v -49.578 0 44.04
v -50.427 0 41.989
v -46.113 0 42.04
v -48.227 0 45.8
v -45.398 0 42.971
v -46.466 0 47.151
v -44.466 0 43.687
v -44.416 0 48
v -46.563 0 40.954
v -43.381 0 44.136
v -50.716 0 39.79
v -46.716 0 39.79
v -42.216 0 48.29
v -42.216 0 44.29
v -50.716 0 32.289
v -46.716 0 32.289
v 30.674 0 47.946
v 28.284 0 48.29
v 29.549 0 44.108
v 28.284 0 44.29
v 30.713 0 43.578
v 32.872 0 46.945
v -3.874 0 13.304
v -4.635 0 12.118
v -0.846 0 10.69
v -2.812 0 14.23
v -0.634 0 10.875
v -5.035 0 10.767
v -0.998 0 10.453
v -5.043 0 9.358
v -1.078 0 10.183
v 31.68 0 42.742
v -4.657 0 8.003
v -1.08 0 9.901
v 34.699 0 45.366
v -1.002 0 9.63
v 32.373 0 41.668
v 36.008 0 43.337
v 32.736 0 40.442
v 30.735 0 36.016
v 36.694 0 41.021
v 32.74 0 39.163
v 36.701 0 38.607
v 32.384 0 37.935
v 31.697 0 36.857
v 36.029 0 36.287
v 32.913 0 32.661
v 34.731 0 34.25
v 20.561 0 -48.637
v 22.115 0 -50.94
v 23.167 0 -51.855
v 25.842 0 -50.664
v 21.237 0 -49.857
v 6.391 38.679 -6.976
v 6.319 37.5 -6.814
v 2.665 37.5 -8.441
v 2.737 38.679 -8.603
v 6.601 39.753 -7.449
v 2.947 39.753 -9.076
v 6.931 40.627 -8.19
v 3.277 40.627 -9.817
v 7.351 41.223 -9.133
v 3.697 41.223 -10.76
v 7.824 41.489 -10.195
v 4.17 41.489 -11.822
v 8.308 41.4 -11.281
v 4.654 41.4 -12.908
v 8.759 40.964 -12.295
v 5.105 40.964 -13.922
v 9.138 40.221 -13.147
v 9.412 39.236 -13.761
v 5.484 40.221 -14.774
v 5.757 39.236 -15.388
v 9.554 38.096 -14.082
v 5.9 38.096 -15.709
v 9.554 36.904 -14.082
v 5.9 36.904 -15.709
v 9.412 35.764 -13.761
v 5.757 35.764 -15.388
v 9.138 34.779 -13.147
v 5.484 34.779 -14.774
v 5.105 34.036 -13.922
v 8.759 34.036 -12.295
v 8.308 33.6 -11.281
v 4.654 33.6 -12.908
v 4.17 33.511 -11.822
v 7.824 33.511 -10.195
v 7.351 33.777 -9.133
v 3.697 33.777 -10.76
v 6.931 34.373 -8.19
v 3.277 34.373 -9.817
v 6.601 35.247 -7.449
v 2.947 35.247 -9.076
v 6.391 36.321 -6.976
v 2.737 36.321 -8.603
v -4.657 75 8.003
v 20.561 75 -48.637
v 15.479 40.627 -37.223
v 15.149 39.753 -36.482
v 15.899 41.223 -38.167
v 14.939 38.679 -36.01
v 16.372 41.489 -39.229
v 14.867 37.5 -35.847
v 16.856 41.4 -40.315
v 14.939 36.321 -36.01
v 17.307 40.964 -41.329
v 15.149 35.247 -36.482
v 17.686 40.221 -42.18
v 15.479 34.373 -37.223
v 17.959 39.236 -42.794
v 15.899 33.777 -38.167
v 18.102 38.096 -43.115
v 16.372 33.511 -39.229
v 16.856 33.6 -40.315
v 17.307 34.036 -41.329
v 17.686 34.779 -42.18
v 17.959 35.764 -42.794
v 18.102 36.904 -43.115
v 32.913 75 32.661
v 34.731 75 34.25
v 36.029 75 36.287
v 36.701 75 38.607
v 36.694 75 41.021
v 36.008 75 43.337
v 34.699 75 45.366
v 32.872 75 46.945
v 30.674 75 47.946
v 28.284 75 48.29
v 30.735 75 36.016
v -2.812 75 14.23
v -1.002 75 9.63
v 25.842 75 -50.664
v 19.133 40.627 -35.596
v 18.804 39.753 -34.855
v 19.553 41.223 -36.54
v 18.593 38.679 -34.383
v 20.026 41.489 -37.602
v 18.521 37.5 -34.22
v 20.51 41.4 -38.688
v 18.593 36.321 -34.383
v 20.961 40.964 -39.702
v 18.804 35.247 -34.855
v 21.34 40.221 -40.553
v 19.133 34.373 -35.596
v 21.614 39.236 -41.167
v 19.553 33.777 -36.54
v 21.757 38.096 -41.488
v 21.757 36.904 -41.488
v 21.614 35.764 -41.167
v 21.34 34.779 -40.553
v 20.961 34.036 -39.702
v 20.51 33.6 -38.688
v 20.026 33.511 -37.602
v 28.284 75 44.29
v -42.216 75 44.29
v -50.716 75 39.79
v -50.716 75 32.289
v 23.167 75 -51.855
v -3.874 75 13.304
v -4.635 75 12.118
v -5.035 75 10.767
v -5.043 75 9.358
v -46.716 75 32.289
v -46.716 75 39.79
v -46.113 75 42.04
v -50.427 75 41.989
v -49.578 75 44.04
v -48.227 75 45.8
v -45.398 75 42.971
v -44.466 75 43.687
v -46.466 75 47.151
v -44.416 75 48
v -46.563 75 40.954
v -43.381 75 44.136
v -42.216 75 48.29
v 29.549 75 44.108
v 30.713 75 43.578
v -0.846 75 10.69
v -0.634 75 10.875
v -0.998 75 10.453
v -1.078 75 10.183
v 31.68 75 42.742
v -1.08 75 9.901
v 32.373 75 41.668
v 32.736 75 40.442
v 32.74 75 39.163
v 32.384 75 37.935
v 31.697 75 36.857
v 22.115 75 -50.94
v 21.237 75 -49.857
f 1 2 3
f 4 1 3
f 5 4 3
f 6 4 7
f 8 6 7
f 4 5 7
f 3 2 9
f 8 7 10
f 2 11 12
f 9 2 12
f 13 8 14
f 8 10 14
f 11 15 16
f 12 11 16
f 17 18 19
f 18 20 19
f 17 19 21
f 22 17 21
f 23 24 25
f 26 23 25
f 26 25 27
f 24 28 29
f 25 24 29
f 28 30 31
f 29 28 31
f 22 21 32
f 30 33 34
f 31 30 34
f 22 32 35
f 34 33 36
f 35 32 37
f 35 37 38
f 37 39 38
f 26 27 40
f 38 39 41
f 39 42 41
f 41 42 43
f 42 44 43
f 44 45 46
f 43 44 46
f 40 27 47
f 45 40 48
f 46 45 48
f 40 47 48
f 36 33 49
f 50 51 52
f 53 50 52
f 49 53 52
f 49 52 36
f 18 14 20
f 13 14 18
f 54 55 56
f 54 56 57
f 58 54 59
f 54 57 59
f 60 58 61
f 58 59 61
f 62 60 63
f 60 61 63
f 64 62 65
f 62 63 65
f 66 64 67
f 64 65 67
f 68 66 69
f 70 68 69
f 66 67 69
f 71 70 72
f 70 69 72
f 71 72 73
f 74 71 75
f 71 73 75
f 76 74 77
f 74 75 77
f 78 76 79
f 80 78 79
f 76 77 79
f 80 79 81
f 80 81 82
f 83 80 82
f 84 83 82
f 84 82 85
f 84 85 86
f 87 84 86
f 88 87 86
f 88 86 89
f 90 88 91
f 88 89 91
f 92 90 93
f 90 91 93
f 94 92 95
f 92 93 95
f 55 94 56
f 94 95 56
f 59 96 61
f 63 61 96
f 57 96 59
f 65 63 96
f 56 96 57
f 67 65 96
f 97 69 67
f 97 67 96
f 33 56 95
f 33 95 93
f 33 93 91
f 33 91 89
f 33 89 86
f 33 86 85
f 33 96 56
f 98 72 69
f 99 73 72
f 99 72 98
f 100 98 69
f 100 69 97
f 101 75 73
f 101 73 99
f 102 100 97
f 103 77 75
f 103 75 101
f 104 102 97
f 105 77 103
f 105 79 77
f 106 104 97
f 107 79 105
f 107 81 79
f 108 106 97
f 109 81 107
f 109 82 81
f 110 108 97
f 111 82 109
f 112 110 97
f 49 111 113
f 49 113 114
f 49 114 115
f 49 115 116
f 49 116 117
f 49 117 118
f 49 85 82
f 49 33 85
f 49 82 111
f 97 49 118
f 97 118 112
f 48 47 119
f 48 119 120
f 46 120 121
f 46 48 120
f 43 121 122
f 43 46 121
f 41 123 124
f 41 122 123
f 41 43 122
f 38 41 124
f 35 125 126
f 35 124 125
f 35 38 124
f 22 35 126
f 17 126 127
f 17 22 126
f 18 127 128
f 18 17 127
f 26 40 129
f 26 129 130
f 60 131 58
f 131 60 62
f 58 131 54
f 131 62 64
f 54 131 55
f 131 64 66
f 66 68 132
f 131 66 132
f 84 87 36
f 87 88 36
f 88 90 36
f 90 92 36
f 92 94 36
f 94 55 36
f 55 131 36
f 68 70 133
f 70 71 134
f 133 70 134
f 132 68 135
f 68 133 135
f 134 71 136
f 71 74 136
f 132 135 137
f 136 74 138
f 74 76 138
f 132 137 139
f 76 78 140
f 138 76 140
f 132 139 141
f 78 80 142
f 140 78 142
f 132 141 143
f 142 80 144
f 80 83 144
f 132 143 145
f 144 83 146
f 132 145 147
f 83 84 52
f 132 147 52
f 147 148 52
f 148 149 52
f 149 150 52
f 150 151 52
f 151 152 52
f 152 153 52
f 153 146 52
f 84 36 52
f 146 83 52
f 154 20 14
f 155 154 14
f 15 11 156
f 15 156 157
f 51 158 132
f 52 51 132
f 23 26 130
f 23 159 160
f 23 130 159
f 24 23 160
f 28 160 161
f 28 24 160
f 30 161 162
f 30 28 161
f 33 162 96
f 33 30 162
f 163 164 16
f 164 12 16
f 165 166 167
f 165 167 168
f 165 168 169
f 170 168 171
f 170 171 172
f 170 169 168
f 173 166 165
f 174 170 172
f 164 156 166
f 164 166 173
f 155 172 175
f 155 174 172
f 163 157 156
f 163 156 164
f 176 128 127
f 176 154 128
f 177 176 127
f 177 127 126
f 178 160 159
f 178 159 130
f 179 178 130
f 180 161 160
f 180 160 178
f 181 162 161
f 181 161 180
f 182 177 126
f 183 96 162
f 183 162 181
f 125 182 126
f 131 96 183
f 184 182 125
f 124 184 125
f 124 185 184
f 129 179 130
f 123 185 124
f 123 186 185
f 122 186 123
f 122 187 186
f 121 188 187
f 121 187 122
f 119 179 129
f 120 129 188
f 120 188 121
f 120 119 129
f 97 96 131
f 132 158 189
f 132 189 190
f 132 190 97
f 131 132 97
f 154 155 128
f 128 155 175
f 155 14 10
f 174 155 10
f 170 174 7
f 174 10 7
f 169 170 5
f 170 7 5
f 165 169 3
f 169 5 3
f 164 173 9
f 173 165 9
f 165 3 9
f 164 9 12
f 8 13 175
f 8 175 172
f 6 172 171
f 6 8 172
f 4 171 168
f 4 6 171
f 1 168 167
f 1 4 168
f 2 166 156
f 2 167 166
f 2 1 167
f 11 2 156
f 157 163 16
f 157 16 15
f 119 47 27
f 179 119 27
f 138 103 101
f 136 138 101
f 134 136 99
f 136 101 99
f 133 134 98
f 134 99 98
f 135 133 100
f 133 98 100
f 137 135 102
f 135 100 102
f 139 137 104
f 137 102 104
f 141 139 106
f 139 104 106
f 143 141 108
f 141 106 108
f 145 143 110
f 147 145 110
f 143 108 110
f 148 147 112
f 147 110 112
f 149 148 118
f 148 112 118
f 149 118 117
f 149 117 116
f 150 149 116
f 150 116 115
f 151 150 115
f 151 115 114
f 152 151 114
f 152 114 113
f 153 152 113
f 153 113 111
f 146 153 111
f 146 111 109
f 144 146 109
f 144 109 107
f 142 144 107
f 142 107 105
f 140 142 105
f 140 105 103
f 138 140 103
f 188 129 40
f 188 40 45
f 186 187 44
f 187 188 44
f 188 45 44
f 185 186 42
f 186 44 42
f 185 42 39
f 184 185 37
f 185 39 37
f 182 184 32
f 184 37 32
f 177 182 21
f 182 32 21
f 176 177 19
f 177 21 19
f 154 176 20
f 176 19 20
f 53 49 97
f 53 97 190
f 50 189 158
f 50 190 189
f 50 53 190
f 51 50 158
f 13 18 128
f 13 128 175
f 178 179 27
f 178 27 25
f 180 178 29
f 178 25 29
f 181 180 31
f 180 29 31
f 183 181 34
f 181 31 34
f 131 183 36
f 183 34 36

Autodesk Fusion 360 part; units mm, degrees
sketch "Sketch1" plane through (0, 0, 0) normal (0, 1, 0) x (1, 0, 0)
  arc A0 (31.1232, 52.6914) -> (20.5609, 48.637) centre (27.8693, 45.3831) ccw
  line L0 (31.1232, 52.6914) -> (40.2587, 48.6241)
  arc A1 (28.2837, -48.2895) -> (32.9132, -32.6608) centre (28.2837, -39.7895) ccw
  line L1 (28.2837, -48.2895) -> (-42.2163, -48.2895)
  arc A2 (-4.6567, -8.0029) -> (-2.8122, -14.2299) centre (-0.089, -10.0365) ccw
  line L2 (22.8004, 52.0184) -> (38.6317, 44.9699)
  line L3 (-46.7163, -32.2895) -> (-50.7163, -32.2895)
  line L4 (35.3386, -39.0053) -> (-23.3345, -39.0053) construction
  arc A3 (28.2837, -44.2895) -> (30.7346, -36.0155) centre (28.2837, -39.7895) ccw
  line L5 (40.2587, 48.6241) -> (38.6317, 44.9699)
  line L6 (30.7346, -36.0155) -> (-2.8122, -14.2299)
  line L7 (-50.7163, -39.7895) -> (-50.7163, -32.2895)
  line L8 (32.9132, -32.6608) -> (-0.6336, -10.8752)
  arc A4 (-46.7163, -39.7895) -> (-42.2163, -44.2895) centre (-42.2163, -39.7895) ccw
  arc A5 (-50.7163, -39.7895) -> (-42.2163, -48.2895) centre (-42.2163, -39.7895) ccw
  line L9 (-4.6567, -8.0029) -> (20.5609, 48.637)
  line L10 (28.2837, -44.2895) -> (-42.2163, -44.2895)
  line L11 (-46.7163, -39.7895) -> (-46.7163, -32.2895)
  arc A6 (22.8004, 52.0184) -> (27.1963, 53.7059) centre (27.8693, 45.3831) ccw
  arc A7 (-1.0025, -9.6298) -> (-0.6336, -10.8752) centre (-0.089, -10.0365) ccw
  line L12 (-1.0025, -9.6298) -> (27.1963, 53.7059)
  point P0 (35.3386, -39.0053)
  point P1 (-46.7163, -44.2895)
  point P2 (23.8148, 55.9453)
  dimension "d1" = 33
  dimension "d2" = 66
  dimension "d3" = 4.5
  dimension "d4" = 5
  dimension "d5" = 12
  dimension "d6" = 18
  dimension "d10" = 75
  dimension "d11" = 70
  dimension "d12" = 40
  dimension "d13" = 8
  dimension "d14" = 4.5
extrude "Extrude1" add sketch "Sketch1" along normal blind 75 contours A0 L2 L9 A6 L12 | A1 L1 A2 L3 A3 L6 L7 L8 A4 A5 L9 L10 L11 A6 A7 L12
sketch "Sketch2" plane through (-0.9127, 0, -0.4064) normal (-0.9135, 0, -0.4067) x (-0.4067, 0, 0.9135)
  line L0 (-52.795, 0) -> (9.205, 0)
  line L1 (9.205, 0) -> (9.205, 75)
  line L2 (9.205, 75) -> (-52.795, 75)
  line L3 (-52.795, 75) -> (-52.795, 0)
  circle A0 centre (-42.795, 37.5) radius 4
  circle A1 centre (-12.795, 37.5) radius 4
  line L4 (-31.6238, 0) -> (-31.6238, 75)
  line L5 (9.205, 37.5) -> (-64.6996, 37.5)
  dimension "d17" = 8
  dimension "d18" = 8
  dimension "d23" = 10
  dimension "d24" = 30
extrude "Extrude2" cut sketch "Sketch2" along normal blind 18 and the other way blind 25 contours A0 L5 | A0 L5 | A1 L5 | A1 L5
